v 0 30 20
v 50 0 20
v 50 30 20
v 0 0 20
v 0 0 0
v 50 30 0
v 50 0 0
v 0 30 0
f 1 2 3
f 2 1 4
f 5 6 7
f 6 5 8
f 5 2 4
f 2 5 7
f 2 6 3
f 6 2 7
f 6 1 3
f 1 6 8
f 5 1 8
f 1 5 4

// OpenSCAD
// Simple box: 50mm wide x 30mm deep x 20mm tall
cube([50, 30, 20]);
